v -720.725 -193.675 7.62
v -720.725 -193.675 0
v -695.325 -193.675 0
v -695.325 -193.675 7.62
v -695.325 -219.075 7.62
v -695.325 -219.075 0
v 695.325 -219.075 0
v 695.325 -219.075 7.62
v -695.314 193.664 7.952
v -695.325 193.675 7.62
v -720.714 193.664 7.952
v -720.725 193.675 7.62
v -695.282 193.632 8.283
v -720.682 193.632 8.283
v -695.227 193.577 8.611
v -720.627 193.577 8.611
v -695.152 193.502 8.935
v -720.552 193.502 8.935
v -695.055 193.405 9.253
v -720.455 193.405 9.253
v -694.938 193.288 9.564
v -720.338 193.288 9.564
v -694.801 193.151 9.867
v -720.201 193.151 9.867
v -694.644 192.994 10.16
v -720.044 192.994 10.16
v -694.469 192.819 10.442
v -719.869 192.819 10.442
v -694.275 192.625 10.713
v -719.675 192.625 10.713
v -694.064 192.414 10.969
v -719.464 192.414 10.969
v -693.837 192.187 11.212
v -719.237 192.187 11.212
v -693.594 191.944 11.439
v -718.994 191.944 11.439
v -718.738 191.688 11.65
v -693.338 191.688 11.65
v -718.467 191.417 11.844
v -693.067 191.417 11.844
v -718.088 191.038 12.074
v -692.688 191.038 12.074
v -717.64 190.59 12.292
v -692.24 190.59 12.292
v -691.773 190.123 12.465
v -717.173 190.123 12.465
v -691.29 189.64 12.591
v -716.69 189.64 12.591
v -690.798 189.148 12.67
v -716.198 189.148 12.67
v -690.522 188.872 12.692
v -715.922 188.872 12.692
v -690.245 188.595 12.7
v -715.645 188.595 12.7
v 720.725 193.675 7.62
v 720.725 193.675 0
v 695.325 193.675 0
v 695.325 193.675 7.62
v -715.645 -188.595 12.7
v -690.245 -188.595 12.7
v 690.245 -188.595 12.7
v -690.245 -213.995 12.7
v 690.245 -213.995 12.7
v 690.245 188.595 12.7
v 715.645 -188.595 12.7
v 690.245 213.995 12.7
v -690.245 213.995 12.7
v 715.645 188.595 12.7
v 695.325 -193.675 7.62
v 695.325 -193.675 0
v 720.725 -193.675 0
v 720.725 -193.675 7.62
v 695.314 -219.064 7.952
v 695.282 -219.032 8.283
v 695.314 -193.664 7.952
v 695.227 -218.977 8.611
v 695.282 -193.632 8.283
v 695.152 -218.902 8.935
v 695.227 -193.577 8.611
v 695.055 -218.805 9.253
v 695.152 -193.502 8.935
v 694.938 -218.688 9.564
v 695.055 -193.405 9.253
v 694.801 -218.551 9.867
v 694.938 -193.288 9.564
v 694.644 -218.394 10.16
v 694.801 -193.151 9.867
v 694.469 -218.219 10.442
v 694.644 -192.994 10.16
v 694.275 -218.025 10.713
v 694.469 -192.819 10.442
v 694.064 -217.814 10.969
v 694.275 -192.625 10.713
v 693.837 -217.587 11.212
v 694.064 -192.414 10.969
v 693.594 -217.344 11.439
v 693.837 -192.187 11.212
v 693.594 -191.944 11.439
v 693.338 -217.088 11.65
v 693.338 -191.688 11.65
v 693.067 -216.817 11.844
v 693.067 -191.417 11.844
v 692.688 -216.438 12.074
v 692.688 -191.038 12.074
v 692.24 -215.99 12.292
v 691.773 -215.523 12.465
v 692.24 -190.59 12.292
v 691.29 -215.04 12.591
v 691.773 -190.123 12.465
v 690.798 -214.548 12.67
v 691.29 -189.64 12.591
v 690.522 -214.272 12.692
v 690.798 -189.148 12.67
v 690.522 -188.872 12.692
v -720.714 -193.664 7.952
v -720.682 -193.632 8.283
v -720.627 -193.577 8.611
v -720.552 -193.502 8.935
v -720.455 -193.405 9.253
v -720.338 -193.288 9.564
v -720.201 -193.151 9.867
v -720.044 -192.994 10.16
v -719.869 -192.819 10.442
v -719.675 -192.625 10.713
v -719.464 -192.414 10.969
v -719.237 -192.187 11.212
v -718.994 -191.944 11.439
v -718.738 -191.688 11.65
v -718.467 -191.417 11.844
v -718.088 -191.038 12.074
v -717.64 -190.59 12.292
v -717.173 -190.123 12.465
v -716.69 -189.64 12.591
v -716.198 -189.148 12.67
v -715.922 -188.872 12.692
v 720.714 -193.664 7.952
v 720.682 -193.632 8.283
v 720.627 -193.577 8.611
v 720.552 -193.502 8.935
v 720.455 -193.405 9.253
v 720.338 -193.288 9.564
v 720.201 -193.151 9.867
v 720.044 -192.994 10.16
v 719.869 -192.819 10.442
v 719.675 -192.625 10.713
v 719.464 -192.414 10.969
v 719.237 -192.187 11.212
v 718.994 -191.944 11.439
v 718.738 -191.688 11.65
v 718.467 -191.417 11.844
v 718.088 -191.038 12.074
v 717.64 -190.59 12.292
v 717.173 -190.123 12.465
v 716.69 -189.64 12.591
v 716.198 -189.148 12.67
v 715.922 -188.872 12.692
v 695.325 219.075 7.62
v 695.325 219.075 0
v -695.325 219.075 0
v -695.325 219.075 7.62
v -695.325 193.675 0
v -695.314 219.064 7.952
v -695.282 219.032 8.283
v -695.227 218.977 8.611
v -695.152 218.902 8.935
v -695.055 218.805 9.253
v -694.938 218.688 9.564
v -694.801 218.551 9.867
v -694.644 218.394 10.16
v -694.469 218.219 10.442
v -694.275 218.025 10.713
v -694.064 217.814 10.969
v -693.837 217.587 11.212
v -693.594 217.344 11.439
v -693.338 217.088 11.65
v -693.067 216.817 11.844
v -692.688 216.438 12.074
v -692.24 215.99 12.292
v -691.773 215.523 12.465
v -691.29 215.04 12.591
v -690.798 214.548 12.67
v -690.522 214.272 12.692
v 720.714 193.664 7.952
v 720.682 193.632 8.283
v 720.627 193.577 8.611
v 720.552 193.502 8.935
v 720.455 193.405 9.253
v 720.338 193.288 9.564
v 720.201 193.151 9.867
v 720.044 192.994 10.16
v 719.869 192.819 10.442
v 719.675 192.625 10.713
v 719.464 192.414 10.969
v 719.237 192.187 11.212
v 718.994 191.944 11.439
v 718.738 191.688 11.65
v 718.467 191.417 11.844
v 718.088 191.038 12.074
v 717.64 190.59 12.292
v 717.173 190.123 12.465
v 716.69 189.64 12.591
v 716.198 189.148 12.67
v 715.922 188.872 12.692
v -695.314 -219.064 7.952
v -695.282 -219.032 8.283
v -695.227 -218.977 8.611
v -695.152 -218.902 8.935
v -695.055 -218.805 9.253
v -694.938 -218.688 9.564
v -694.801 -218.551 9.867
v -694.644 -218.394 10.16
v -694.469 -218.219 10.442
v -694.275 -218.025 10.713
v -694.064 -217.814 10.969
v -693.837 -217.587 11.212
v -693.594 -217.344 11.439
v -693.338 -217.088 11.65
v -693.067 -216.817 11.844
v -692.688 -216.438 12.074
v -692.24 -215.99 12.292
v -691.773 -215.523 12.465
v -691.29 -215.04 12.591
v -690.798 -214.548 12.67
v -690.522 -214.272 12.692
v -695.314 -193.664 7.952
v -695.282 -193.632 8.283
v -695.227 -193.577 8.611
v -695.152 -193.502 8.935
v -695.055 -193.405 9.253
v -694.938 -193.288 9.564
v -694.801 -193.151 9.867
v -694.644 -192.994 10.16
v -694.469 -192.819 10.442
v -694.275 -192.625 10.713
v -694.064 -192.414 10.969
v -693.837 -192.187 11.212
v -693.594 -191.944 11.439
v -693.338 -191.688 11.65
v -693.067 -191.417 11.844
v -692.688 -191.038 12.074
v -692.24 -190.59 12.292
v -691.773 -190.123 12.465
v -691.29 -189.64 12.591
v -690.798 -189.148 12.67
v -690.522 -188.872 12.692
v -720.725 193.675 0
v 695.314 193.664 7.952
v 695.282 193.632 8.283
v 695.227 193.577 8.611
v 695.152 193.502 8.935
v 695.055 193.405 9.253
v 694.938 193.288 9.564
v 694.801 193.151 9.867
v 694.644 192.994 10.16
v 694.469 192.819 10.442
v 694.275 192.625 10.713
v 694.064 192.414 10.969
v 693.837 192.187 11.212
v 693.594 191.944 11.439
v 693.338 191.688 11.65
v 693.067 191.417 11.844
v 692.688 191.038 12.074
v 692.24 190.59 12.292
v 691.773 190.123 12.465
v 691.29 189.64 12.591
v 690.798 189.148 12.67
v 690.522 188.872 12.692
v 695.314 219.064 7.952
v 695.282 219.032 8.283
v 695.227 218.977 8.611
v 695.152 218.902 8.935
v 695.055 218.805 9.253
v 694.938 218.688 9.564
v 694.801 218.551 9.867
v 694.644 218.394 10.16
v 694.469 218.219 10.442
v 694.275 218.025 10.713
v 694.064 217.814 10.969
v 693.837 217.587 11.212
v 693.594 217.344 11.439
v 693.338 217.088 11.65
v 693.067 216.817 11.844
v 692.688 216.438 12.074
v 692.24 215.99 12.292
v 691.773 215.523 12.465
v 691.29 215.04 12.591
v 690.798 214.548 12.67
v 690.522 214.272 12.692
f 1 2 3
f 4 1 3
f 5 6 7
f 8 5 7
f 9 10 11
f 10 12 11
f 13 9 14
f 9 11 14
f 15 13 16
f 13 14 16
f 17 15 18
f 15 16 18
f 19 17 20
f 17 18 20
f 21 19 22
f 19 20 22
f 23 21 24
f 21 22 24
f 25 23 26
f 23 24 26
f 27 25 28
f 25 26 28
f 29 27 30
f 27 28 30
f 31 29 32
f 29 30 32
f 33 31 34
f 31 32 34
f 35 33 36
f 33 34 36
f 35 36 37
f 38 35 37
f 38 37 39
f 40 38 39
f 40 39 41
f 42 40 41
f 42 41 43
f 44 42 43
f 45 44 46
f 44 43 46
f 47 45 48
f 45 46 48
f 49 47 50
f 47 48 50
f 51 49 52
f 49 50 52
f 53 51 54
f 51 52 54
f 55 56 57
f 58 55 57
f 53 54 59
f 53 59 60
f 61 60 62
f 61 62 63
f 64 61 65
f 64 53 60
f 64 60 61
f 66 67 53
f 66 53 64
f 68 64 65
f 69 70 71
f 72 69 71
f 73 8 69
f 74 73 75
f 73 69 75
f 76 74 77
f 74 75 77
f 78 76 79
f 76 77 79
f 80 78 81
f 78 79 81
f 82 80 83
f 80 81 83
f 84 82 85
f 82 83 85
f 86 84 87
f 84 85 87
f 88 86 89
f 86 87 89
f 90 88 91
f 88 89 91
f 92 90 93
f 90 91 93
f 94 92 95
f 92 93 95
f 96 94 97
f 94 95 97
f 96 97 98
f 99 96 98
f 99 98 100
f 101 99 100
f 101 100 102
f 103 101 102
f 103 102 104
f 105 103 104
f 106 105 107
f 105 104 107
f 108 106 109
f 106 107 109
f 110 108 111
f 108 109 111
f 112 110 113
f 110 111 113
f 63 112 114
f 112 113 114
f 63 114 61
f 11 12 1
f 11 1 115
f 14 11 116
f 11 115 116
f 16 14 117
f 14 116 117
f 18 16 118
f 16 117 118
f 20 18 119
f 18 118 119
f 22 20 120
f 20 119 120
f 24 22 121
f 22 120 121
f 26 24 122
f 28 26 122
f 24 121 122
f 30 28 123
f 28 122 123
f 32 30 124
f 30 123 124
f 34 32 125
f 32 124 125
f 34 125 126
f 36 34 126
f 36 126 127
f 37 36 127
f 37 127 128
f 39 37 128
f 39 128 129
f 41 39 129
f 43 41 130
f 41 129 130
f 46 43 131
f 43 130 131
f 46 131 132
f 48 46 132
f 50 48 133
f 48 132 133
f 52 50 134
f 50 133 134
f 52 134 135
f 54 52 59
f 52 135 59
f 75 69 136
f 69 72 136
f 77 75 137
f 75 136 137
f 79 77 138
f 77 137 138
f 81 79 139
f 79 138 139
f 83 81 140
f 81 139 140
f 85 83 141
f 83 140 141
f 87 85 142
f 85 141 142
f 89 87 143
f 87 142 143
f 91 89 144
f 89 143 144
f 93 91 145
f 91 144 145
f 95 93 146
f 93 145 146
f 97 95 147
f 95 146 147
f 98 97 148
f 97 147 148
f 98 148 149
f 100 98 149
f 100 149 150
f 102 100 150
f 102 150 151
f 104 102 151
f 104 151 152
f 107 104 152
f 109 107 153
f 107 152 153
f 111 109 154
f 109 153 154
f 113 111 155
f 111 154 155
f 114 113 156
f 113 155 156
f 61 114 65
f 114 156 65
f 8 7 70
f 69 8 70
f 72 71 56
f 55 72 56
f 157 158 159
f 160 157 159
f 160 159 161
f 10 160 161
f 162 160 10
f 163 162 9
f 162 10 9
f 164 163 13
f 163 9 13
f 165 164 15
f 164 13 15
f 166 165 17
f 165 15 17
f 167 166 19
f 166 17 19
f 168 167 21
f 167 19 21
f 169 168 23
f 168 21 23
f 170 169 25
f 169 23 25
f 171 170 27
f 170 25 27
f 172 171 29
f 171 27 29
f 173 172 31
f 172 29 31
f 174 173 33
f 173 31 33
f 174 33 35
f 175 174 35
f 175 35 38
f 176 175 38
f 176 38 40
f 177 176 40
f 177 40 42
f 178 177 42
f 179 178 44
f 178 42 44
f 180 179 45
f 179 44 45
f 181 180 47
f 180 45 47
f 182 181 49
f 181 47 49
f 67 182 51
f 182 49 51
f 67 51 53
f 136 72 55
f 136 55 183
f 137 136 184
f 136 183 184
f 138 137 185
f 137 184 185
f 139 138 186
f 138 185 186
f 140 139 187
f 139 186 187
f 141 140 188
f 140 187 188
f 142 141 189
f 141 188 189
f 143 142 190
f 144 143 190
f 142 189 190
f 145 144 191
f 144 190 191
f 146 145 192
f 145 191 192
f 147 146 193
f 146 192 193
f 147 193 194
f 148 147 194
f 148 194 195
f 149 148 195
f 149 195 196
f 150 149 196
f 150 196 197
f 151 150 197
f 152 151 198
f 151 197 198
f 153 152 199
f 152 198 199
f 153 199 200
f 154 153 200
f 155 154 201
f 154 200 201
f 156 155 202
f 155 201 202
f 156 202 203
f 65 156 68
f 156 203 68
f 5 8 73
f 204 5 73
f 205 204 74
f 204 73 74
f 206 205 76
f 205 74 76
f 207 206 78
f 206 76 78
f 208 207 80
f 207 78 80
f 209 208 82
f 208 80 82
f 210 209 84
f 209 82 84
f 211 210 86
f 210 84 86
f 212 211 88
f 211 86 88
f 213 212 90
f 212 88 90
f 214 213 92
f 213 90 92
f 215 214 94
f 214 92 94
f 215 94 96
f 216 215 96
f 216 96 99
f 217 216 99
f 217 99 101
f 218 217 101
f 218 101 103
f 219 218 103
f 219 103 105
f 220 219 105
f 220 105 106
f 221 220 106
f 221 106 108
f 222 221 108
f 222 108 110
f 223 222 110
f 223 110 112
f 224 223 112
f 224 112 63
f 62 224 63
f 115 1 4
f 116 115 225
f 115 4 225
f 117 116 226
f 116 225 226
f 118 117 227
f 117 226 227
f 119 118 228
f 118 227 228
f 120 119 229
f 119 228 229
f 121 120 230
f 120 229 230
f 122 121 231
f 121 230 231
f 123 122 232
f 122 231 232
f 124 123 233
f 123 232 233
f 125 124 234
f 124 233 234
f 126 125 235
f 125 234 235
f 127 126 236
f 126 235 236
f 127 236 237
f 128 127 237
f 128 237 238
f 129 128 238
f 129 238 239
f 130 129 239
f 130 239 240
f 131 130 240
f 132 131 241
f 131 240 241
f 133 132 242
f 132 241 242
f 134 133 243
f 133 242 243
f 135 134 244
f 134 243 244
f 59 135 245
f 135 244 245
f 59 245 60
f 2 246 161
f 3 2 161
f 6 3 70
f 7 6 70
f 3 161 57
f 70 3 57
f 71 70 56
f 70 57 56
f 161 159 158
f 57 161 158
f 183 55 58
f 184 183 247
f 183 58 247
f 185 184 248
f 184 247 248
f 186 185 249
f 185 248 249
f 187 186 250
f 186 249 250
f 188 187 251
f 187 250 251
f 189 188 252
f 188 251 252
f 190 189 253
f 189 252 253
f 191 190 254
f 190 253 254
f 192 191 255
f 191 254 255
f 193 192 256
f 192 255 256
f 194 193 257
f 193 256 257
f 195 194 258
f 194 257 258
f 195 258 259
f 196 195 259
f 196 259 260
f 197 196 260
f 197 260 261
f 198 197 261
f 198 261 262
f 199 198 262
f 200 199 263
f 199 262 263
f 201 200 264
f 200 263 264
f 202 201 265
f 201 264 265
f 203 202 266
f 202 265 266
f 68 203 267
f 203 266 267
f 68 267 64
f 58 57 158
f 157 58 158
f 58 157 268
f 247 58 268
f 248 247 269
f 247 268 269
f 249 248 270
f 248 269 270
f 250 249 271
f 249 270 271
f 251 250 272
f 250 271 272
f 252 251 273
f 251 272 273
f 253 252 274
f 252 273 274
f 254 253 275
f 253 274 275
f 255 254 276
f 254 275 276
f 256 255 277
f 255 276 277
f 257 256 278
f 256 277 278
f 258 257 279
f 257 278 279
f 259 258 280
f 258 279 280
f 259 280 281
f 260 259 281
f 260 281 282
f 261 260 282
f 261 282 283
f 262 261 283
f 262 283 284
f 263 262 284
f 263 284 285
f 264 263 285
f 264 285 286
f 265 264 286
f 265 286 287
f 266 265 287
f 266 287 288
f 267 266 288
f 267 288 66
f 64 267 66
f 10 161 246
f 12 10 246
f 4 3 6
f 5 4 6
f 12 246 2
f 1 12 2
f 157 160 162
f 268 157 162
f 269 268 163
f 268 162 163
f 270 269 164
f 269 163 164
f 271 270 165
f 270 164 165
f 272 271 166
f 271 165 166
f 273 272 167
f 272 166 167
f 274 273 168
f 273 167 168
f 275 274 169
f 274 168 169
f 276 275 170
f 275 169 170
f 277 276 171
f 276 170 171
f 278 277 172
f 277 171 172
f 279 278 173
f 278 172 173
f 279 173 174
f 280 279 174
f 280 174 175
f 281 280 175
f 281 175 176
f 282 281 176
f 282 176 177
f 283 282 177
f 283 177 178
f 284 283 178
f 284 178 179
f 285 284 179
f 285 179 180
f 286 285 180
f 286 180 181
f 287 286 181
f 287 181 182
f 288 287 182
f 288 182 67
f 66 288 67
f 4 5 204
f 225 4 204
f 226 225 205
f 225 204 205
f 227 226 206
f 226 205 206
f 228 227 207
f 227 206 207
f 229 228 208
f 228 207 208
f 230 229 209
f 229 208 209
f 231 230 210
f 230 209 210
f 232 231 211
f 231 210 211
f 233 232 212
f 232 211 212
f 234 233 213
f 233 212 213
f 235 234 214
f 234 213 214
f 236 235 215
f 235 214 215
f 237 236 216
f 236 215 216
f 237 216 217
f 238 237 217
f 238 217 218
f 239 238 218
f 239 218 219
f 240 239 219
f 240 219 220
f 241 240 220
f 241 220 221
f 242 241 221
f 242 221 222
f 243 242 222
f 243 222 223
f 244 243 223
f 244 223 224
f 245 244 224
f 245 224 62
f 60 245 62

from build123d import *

# Parameters (mm, degrees)
F1_DEPTH = 12.7
F2_R     = 5.08


with BuildPart() as f1:
    # F0 (on Top) → F1 (new body)
    with BuildSketch(Plane.XY):
        Polygon((695.325, 193.675), (695.325, 219.075), (-695.325, 219.075), (-695.325, 193.675), (-720.725, 193.675), (-720.725, -193.675), (-695.325, -193.675), (-695.325, -219.075), (695.325, -219.075), (695.325, -193.675), (720.725, -193.675), (720.725, 193.675), align=None)
    extrude(amount=F1_DEPTH)

    # F2
    f2_edges = [f1.edges().sort_by_distance(p)[0] for p in [
        (695.325, 206.375, 12.7),
        (0, 219.075, 12.7),
        (-695.325, 206.375, 12.7),
        (-708.025, 193.675, 12.7),
        (-720.725, 0, 12.7),
        (-708.025, -193.675, 12.7),
        (-695.325, -206.375, 12.7),
        (0, -219.075, 12.7),
        (695.325, -206.375, 12.7),
        (708.025, -193.675, 12.7),
        (720.725, 0, 12.7),
        (708.025, 193.675, 12.7),
    ]]
    fillet(f2_edges, radius=F2_R)


solid = f1.part
